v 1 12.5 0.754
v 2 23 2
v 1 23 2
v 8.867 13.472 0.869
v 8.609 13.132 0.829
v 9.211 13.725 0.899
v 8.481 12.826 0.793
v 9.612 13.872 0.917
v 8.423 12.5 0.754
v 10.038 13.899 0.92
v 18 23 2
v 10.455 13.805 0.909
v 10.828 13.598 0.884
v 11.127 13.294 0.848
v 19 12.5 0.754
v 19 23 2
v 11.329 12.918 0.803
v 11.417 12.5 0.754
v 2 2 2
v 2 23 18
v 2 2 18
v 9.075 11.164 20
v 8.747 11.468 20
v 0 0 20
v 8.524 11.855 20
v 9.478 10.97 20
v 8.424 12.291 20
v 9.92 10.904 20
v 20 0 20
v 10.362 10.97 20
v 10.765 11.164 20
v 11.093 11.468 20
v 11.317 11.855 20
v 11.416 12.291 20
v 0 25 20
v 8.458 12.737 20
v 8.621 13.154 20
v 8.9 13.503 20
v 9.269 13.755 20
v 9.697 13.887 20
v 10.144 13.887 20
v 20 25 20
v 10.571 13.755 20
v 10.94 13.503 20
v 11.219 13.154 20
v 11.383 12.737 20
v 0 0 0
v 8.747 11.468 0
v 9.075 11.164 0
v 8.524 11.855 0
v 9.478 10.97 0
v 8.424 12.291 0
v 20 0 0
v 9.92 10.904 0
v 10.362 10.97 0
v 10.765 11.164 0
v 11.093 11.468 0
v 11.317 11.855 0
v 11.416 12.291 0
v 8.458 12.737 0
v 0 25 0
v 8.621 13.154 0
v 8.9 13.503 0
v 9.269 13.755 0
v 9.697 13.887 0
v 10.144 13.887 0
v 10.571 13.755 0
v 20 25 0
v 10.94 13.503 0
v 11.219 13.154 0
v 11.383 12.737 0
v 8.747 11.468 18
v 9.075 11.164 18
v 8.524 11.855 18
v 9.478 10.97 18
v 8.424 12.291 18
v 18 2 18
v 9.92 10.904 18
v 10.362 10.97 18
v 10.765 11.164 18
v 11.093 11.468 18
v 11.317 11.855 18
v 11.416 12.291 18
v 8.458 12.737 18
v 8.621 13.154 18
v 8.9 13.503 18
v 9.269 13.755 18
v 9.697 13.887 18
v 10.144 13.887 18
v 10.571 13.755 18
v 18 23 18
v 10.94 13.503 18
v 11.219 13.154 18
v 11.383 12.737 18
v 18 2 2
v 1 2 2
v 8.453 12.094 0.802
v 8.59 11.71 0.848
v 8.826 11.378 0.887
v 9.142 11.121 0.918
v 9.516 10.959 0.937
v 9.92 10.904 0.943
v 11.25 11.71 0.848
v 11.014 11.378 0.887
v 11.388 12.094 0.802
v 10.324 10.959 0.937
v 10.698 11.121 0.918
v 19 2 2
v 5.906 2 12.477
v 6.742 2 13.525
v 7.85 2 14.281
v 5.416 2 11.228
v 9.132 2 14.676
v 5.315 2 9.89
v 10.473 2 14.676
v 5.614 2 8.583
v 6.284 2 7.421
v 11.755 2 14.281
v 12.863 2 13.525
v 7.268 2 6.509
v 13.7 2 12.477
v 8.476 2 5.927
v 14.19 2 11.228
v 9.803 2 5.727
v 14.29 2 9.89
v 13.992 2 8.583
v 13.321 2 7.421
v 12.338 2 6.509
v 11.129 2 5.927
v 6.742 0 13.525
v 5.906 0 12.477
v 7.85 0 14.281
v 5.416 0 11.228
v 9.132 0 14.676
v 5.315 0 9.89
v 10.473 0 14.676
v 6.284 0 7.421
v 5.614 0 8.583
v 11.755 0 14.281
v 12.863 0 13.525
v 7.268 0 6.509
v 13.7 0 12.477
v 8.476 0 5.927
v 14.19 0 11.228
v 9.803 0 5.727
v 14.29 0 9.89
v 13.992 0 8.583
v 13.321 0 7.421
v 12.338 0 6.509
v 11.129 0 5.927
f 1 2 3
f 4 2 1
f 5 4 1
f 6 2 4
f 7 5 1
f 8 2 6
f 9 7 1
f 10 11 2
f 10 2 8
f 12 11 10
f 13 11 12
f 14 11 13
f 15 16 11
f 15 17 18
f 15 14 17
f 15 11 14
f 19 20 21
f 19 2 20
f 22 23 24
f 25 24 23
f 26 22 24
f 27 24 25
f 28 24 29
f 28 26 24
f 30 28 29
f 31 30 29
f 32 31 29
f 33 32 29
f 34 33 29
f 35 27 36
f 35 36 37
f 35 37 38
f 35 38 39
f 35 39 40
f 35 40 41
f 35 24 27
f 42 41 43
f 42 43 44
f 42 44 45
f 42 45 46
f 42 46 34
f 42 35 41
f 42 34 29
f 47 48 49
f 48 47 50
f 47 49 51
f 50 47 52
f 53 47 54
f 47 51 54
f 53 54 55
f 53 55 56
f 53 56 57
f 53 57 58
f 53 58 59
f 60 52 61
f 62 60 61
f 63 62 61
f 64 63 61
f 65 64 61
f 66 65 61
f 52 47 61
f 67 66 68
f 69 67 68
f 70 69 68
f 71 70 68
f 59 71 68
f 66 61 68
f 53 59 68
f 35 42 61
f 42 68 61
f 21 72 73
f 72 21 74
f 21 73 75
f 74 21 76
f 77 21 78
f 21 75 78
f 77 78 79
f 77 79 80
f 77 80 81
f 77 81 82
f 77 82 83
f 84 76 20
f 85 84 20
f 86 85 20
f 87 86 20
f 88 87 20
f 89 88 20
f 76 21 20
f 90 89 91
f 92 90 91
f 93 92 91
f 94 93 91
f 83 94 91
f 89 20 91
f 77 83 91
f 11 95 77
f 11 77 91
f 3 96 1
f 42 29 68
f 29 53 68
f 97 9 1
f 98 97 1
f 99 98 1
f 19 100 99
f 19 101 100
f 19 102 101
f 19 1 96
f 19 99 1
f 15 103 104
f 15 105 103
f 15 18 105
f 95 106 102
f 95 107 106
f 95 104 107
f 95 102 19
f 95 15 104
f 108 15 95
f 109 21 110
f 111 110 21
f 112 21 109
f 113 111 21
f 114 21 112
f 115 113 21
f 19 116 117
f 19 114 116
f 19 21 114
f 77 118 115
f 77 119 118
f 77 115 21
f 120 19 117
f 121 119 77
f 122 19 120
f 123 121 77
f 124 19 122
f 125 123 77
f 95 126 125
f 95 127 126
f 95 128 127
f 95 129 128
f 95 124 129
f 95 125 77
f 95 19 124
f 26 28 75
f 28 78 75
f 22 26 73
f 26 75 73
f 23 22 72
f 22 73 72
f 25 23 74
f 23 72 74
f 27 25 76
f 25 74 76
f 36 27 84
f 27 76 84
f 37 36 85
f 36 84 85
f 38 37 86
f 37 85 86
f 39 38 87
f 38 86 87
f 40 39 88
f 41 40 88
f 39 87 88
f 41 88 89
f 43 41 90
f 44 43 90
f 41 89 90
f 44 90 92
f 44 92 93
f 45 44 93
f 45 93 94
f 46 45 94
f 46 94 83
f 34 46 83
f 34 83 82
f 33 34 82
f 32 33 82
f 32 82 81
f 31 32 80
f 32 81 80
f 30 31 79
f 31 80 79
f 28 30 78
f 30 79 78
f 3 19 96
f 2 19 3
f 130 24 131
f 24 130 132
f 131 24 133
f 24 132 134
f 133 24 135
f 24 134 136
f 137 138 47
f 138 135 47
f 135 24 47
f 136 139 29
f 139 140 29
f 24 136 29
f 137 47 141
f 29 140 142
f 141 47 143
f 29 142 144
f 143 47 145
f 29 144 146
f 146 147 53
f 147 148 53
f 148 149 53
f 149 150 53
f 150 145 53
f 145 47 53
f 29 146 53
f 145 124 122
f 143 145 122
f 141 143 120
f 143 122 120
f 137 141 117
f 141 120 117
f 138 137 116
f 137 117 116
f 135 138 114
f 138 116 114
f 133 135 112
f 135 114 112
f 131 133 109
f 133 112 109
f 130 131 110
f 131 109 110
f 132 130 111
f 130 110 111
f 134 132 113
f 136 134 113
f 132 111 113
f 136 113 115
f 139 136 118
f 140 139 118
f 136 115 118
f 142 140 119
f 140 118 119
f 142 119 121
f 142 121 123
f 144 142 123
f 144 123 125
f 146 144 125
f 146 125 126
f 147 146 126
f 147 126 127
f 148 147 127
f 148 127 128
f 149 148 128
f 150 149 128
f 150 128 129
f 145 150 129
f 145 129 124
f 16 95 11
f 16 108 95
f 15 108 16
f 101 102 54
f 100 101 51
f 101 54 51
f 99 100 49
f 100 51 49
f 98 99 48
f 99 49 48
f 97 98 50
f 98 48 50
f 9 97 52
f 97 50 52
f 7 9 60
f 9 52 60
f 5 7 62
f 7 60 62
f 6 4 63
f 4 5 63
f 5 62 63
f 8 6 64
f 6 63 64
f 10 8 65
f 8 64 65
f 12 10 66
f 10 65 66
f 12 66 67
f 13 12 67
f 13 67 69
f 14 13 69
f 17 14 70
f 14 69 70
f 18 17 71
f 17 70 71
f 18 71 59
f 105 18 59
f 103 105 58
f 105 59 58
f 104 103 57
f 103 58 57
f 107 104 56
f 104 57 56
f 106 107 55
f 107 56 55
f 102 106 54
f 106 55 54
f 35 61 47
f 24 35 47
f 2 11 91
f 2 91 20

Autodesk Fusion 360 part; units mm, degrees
sketch "Sketch1" plane through (0, 0, 0) normal (0, 0, 1) x (1, 0, 0)
  line L0 (0, 0) -> (20, 0)
  line L1 (20, 0) -> (20, 25)
  line L2 (20, 25) -> (0, 25)
  line L3 (0, 25) -> (0, 0)
extrude "Extrude1" add sketch "Sketch1" along normal blind 20
sketch "Sketch2" plane through (0, 0, 0) normal (0, 0, -1) x (1, 0, 0)
  line L0 (0, 0) -> (0, -25)
  line L1 (0, -25) -> (20, -25)
  line L2 (20, -25) -> (20, 0)
  line L3 (20, 0) -> (0, 0)
shell "Shell1" thickness 2 removed faces 0 bodies 1
sketch "Sketch3" plane through (0, 0, 20) normal (0, 0, 1) x (-1, 0, 0)
  line L0 (0, -25) -> (0, 0)
  line L1 (0, 0) -> (-20, 0)
  line L2 (-20, 0) -> (-20, -25)
  line L3 (-20, -25) -> (0, -25)
hole "Hole1" at (9.9202, 12.4035, 20) direction (0, 0, -1) diameter 3 depth 25 tip angle 118
hole "Hole2" at (9.8027, 0, 10.2267) direction (0, 1, 0) diameter 9 depth 4 tip angle 118
sketch "Sketch4" plane through (20, 0, 0) normal (1, 0, 0) x (0, 1, 0)
  line L0 (0, 0) -> (25, 0)
  line L1 (25, 0) -> (25, 20)
  line L2 (25, 20) -> (0, 20)
  line L3 (0, 20) -> (0, 0)
  line L4 (12.5, 0.7539) -> (2, 2)
  line L5 (2, 2) -> (23, 2)
  line L6 (23, 2) -> (12.5, 0.7539)
  line L7 (2, 2) -> (23, 2)
  line L8 (2, 2) -> (12.5, 0.7539)
  line L9 (23, 2) -> (12.5, 0.7539)
extrude "Extrude2" cut sketch "Sketch4" against normal blind 18 from surface at -1 contours L4 L5 L6 L7 L8 L9
ref_plane "WorkPlane1" through (0, 0, 20) normal (0.6155, -0.4924, 0.6155) x (0.6247, 0.7809, 0)
ref_plane "WorkPlane2" through (15, 12.5, 10) normal (1, 0, 0) x (0, 1, 0)
sketch "Sketch7" plane through (15, 0, 0) normal (1, 0, 0) x (0, 1, 0)
  line L0 (-2, 22) -> (31, 22)
  line L1 (31, 22) -> (31, -5)
  line L2 (31, -5) -> (-2, -5)
  line L3 (-2, -5) -> (-2, 22)
sketch "Sketch6" plane through (7.5758, -6.0606, 7.5758) normal (0.6155, -0.4924, 0.6155) x (0.6247, 0.7809, 0)
  line L0 (-4, 34) -> (46, 34)
  line L1 (46, 34) -> (46, -16)
  line L2 (46, -16) -> (-4, -16)
  line L3 (-4, -16) -> (-4, 34)
extrude "Extrude3" [suppressed]
sketch "Sketch5" plane through (0, 25, 0) normal (0, 1, 0) x (-1, 0, 0)
  line L0 (-20, 0) -> (0, 0)
  line L1 (0, 0) -> (0, 20)
  line L2 (0, 20) -> (-20, 20)
  line L3 (-20, 20) -> (-20, 0)
  line L4 (-10, 0.754) -> (-18, 2)
  line L5 (-18, 2) -> (-2, 2)
  line L6 (-2, 2) -> (-10, 0.754)
